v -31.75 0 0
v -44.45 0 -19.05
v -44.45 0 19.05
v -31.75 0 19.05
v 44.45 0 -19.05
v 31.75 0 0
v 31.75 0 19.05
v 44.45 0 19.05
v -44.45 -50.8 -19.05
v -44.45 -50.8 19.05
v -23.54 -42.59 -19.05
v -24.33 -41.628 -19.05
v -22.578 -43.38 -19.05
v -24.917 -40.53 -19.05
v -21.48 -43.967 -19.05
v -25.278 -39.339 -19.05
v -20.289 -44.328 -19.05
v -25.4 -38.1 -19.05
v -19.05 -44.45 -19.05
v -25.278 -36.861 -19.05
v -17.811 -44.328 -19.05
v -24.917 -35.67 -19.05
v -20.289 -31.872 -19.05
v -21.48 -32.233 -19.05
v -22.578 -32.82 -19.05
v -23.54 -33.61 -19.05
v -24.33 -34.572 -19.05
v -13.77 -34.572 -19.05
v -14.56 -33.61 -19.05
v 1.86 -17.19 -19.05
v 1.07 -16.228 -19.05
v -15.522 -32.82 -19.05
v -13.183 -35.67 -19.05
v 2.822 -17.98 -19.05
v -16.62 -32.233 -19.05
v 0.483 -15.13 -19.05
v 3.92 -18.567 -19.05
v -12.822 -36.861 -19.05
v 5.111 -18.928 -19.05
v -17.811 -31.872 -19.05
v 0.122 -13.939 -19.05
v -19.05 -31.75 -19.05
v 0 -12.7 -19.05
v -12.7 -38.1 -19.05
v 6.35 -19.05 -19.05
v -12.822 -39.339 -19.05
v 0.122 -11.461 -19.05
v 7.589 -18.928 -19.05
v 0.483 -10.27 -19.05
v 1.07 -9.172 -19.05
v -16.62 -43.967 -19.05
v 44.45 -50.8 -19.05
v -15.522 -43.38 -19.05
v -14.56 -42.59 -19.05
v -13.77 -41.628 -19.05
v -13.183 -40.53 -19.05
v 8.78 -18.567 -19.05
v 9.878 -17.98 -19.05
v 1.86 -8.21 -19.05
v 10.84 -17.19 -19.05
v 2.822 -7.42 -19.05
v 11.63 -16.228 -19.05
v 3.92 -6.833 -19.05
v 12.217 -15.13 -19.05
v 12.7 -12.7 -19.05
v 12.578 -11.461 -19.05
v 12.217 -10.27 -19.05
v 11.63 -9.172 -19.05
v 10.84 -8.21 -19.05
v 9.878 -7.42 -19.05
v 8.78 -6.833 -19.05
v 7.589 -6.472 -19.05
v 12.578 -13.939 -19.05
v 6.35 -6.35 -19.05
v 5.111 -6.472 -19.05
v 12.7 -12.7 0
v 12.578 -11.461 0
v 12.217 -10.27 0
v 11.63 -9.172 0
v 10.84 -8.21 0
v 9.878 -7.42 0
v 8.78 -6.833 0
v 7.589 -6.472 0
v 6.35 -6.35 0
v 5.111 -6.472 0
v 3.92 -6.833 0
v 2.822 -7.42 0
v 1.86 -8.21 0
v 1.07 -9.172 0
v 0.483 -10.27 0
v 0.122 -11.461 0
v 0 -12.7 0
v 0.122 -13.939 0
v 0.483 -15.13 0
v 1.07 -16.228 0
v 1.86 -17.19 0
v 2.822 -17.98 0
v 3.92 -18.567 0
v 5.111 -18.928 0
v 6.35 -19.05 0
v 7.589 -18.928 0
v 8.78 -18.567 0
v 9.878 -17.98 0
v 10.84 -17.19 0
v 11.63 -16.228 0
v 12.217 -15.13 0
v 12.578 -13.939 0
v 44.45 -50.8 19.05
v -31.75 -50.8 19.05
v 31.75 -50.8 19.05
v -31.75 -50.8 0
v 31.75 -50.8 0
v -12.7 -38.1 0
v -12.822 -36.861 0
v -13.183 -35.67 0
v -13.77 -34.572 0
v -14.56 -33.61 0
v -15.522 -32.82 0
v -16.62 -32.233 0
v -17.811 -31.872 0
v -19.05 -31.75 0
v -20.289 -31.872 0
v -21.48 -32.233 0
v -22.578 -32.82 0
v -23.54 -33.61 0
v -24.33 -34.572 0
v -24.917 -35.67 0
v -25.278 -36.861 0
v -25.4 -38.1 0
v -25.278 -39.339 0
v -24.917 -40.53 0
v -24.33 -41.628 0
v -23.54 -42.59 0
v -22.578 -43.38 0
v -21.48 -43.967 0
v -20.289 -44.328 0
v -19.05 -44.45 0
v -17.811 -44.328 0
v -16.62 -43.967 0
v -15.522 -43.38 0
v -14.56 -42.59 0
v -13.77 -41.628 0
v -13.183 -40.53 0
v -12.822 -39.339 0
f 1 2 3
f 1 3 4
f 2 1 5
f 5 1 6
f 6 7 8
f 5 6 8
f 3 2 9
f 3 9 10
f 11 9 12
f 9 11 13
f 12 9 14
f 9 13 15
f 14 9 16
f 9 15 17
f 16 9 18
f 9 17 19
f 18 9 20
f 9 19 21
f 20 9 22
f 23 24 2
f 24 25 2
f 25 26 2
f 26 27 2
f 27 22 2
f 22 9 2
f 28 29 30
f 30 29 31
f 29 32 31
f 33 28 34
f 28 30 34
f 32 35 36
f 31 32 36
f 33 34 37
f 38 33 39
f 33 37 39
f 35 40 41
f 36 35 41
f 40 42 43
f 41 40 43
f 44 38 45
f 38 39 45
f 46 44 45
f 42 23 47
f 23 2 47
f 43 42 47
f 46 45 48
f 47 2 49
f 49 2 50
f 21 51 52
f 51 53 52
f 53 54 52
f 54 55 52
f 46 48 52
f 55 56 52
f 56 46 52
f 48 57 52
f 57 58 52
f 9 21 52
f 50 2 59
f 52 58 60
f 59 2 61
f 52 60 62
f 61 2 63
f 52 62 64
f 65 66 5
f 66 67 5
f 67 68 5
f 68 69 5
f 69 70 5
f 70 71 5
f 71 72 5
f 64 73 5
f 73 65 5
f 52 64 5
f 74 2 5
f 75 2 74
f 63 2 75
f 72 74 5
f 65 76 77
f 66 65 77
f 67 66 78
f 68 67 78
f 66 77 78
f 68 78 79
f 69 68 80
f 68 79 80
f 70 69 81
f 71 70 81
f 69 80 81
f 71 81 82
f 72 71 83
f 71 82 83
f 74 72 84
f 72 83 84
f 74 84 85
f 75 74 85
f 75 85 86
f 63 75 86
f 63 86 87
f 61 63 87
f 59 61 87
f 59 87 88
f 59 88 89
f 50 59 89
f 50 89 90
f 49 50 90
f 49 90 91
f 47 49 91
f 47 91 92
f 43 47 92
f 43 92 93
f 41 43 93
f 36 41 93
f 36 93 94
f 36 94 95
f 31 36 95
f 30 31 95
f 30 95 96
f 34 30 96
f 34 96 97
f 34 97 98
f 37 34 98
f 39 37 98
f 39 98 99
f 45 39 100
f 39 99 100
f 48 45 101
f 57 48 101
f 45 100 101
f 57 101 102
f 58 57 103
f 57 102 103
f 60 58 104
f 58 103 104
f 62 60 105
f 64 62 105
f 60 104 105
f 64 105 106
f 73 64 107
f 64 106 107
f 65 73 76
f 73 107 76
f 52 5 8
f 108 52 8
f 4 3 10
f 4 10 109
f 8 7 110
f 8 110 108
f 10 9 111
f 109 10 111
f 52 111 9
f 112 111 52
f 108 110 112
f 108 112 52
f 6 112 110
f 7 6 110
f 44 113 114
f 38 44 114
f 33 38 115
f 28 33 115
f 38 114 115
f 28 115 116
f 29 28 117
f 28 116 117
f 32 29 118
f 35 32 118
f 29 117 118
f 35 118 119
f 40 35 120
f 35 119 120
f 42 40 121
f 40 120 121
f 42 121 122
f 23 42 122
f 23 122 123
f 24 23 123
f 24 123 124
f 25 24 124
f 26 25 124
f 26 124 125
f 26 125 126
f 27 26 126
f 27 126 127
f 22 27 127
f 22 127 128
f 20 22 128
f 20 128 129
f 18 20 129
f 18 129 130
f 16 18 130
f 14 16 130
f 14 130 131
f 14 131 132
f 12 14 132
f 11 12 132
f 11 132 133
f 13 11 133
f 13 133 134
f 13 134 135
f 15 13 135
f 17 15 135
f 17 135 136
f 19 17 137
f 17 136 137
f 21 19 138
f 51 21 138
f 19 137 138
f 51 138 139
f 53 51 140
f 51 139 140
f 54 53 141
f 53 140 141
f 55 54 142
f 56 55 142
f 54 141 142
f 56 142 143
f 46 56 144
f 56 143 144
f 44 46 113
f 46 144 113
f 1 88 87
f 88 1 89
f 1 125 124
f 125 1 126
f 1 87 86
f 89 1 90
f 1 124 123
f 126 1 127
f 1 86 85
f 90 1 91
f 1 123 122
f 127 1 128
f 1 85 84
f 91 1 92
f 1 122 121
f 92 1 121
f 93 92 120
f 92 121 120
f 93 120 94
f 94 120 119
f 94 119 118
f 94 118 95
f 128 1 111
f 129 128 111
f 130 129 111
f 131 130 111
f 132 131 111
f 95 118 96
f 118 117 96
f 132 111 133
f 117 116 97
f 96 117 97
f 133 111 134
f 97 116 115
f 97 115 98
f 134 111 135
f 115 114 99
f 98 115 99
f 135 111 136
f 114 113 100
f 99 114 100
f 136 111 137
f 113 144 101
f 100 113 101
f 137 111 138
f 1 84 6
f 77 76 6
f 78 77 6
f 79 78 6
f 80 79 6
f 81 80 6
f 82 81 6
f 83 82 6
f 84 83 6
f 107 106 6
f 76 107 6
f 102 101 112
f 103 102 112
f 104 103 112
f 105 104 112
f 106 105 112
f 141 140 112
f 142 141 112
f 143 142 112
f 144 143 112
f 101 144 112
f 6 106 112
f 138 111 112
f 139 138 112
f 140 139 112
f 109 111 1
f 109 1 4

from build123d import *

# Parameters (mm, degrees)
F0_W     = 88.9
F0_H     = 38.1
F1_DEPTH = 50.8
F2_W     = 63.5
F2_H     = 19.05
F3_DEPTH = 50.801
F4_R     = 6.35
F5_DEPTH = 19.051
F6_R     = 6.35
F7_DEPTH = 19.051


with BuildPart() as f1:
    # F0 (on Front) → F1 (new body)
    with BuildSketch(Plane.XZ):
        Rectangle(F0_W, F0_H)
    extrude(amount=F1_DEPTH)

    # F2 (on face) → F3 (cut, through all)
    with BuildSketch(Plane.XZ.offset(50.8)):
        with Locations((0, 9.525)):
            Rectangle(F2_W, F2_H)
    extrude(amount=-F3_DEPTH, mode=Mode.SUBTRACT)

    # F4 (on face) → F5 (cut, through all)
    with BuildSketch(Plane.XY):
        with Locations((-19.05, -38.1)):
            Circle(F4_R)
    extrude(amount=-F5_DEPTH, mode=Mode.SUBTRACT)

    # F6 (on face) → F7 (cut, through all)
    with BuildSketch(Plane.XY):
        with Locations((6.35, -12.7)):
            Circle(F6_R)
    extrude(amount=-F7_DEPTH, mode=Mode.SUBTRACT)


solid = f1.part
